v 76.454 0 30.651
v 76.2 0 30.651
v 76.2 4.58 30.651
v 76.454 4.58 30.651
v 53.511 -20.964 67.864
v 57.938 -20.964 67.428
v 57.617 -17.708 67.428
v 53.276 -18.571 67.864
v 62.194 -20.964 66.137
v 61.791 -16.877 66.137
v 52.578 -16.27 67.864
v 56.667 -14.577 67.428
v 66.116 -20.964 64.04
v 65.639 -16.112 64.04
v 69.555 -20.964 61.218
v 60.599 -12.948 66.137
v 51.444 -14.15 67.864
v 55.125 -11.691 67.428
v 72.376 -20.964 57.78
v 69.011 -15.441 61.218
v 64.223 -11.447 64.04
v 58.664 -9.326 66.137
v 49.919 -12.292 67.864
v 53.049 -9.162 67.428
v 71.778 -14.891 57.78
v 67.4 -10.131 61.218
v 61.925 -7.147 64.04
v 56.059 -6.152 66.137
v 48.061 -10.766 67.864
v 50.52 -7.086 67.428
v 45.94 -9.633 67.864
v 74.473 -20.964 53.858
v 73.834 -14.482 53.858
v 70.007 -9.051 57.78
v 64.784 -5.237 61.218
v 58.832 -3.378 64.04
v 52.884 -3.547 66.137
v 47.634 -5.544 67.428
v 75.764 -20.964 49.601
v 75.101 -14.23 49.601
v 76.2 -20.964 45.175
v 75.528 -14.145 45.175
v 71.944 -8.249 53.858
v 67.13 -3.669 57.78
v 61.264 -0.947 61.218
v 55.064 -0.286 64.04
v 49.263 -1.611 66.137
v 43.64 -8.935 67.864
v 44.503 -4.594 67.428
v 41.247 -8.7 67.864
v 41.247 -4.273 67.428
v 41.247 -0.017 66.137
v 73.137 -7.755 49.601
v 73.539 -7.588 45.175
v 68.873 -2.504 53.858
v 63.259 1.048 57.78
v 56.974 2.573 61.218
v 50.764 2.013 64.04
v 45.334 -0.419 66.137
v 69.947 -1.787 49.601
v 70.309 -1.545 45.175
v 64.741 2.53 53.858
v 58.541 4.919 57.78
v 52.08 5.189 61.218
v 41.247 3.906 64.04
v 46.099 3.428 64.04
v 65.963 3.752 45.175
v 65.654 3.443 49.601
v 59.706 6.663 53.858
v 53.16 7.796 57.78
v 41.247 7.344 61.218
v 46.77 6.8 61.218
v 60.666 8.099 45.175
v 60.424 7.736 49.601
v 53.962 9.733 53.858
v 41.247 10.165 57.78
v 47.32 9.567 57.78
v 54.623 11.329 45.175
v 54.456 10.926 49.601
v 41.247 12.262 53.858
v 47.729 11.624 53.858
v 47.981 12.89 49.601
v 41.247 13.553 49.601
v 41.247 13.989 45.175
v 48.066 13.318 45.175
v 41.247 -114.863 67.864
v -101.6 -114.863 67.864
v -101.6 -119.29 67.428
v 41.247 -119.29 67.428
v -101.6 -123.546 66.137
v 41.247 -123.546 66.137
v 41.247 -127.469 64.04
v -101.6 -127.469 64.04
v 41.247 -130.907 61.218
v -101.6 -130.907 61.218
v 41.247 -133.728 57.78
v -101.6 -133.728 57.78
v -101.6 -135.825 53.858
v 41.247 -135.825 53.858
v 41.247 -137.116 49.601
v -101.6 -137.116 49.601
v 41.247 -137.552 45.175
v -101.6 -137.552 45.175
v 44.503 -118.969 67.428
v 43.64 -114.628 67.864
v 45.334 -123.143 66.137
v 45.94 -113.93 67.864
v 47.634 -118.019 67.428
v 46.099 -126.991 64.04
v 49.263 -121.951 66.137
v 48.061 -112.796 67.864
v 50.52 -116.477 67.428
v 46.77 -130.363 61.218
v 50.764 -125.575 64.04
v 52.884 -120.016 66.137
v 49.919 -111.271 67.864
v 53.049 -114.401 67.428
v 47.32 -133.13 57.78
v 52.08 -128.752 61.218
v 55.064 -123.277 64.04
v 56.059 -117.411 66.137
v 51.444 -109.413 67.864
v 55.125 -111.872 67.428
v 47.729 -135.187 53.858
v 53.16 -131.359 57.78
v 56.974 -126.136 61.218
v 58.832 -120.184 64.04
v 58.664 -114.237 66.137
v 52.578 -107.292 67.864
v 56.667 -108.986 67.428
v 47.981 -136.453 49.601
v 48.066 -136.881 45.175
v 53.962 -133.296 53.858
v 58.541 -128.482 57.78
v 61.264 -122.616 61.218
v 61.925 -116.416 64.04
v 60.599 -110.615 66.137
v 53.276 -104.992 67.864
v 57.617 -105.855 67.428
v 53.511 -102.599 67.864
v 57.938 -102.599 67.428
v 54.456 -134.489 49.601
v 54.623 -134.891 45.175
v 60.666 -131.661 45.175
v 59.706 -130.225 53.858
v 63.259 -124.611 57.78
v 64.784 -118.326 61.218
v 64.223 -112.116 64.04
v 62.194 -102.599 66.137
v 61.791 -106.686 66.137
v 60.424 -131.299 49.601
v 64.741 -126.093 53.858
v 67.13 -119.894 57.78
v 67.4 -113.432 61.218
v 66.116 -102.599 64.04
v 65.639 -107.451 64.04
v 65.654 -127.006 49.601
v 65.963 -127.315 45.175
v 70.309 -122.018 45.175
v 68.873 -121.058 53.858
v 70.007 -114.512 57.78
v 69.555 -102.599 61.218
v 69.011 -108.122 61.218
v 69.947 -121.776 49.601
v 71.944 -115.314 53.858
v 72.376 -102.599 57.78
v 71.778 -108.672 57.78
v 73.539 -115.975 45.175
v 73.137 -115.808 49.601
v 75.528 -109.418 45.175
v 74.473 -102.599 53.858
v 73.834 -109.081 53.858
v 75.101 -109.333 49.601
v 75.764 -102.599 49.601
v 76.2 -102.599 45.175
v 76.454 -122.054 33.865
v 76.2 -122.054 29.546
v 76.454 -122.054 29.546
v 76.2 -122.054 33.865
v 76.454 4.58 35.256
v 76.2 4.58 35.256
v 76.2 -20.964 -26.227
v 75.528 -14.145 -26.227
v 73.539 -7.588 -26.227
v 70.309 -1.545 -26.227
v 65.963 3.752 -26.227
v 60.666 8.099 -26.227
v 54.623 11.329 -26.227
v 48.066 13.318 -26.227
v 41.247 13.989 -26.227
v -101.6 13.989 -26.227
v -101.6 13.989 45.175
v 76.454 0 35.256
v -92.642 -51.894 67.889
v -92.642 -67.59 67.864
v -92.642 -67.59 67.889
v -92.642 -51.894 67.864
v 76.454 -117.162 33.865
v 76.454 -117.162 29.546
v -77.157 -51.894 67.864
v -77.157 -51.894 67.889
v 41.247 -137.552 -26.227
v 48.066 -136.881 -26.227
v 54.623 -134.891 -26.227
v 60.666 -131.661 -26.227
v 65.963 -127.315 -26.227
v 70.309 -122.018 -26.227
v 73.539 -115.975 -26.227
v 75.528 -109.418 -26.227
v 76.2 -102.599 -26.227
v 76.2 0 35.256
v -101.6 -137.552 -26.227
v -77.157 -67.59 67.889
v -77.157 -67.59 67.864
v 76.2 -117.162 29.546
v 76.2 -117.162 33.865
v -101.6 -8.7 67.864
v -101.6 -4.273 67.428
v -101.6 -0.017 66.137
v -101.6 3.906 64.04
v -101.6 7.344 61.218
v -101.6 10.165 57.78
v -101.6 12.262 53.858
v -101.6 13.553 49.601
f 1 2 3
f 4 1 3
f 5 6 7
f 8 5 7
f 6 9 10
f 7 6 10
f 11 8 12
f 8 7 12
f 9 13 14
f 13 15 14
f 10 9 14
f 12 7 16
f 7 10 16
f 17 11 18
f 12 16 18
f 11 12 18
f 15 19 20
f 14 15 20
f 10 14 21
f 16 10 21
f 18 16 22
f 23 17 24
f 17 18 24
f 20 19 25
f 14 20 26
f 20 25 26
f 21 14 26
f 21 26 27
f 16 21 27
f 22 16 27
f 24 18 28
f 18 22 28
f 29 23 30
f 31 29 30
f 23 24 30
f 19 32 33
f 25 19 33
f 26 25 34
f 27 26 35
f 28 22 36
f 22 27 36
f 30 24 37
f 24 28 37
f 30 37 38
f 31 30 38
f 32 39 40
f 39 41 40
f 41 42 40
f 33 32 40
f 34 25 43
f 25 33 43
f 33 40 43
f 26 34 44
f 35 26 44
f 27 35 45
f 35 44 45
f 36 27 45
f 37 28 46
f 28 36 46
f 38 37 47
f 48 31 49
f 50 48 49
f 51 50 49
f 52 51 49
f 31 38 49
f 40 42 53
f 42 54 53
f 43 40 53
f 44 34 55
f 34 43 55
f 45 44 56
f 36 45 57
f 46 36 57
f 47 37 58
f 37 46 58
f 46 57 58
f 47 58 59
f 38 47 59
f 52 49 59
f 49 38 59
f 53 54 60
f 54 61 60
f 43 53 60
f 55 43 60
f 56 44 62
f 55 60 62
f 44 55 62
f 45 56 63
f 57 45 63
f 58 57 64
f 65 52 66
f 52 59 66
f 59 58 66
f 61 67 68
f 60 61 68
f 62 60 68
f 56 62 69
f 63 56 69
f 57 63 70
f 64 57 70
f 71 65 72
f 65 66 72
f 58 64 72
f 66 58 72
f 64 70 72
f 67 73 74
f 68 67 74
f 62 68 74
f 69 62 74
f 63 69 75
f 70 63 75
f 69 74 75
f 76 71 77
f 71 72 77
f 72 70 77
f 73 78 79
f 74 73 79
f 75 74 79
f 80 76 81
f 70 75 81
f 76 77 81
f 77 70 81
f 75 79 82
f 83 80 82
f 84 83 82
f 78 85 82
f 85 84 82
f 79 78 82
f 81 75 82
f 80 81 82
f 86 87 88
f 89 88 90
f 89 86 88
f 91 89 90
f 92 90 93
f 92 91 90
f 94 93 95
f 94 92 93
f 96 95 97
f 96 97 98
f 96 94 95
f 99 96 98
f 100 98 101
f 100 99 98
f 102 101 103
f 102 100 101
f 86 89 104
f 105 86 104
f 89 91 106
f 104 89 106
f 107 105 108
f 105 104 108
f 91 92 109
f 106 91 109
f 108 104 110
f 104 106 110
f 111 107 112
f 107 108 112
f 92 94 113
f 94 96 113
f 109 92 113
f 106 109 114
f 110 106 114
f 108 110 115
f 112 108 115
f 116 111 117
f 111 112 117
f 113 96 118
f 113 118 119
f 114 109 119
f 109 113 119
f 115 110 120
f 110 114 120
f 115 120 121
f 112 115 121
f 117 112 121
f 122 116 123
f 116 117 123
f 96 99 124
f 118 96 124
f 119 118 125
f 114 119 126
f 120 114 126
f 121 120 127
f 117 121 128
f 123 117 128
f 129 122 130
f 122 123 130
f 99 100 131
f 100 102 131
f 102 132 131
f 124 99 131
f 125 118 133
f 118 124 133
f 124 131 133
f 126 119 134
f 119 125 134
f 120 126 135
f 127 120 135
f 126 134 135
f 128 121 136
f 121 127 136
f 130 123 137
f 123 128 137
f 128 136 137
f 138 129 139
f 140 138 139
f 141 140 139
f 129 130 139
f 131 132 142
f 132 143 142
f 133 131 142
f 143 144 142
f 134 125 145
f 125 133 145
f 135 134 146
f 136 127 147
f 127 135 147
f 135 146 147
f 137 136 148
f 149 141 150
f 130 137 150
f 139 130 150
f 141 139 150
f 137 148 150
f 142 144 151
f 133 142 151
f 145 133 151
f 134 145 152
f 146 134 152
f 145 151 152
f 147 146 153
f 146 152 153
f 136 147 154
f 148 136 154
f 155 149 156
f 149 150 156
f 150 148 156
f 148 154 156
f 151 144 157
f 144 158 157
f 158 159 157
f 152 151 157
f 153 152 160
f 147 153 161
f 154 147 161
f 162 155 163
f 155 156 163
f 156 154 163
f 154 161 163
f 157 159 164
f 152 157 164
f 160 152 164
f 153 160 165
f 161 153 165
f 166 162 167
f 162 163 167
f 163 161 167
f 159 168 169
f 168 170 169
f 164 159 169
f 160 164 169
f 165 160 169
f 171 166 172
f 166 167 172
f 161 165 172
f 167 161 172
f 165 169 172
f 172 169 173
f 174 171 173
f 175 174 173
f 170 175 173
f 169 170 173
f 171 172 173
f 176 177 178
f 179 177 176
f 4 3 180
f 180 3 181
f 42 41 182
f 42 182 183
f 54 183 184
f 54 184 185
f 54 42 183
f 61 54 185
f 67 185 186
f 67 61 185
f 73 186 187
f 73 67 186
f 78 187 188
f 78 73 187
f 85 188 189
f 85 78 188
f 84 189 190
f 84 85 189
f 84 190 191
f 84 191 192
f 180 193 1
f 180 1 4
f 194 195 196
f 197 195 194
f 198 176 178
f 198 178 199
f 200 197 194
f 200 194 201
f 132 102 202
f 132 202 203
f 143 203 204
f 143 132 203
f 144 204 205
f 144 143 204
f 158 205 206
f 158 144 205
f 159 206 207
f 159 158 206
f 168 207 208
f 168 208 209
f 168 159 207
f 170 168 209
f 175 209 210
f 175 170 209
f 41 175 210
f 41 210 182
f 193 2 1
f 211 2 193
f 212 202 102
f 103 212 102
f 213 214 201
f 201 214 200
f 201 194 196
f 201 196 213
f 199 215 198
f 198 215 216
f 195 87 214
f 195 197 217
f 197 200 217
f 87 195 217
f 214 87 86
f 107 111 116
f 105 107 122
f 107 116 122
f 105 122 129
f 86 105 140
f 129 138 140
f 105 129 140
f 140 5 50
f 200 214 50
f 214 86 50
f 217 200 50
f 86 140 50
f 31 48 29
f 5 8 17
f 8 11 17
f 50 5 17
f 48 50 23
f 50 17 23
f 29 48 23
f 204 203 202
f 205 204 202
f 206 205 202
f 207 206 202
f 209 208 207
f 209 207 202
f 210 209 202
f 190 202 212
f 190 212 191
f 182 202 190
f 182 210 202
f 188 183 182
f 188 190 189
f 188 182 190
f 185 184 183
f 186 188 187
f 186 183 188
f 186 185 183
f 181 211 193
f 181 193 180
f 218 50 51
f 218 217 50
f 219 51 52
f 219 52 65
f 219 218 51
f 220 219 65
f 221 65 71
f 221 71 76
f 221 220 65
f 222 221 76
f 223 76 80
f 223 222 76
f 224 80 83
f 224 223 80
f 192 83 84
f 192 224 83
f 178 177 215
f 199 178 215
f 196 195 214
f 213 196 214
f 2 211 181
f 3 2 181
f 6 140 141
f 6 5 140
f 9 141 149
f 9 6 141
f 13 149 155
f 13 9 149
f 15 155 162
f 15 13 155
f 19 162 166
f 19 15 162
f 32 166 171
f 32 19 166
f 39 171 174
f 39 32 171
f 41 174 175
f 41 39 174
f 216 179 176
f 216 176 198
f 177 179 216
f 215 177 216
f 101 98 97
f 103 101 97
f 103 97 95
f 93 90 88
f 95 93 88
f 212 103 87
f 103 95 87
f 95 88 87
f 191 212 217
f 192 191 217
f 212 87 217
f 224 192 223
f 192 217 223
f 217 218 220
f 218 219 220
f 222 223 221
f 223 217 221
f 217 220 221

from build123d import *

# Parameters (mm, degrees)
F0_W      = 151.5413392335
F0_H      = 94.0903741866
F1_DEPTH  = 76.2
F2_DEPTH  = 101.6
F3_R      = 34.952983956
F4_R      = 22.6887790592
F5_W      = 15.484392643
F5_H      = 15.6958438456
F6_DEPTH  = 0.0254
F7_W      = 4.5801447704
F7_H      = 4.6048928052
F8_DEPTH  = 0.254
F9_W      = 4.8926994205
F9_H      = 4.318498075
F10_DEPTH = 0.254


with BuildPart() as f1:
    # F0 (on Right) → F1 (new body)
    with BuildSketch(Plane.YZ):
        with Locations((-61.7814576253, 20.8186497912)):
            Rectangle(F0_W, F0_H)
    extrude(amount=F1_DEPTH)

    # F2 (add): a face of the model
    f2_faces = [f1.faces().sort_by_distance(p)[0] for p in [
        (0, -61.7814576253, 20.8186497912),
    ]]
    extrude(f2_faces, amount=F2_DEPTH)

    # F3
    f3_edges = [f1.edges().sort_by_distance(p)[0] for p in [
        (76.2, -137.552127, 20.81865),
        (76.2, 13.989212, 20.81865),
    ]]
    fillet(f3_edges, radius=F3_R)

    # F4
    f4_edges = [f1.edges().sort_by_distance(p)[0] for p in [
        (76.2, -61.781458, 67.863837),
    ]]
    fillet(f4_edges, radius=F4_R)

    # F5 (on face) → F6 (join)
    with BuildSketch(Plane.XY.offset(67.8638368845)):
        with Locations((-84.8993882537, -59.7420018166)):
            Rectangle(F5_W, F5_H)
    extrude(amount=F6_DEPTH)


with BuildPart() as f8:
    # F7 (on face) → F8 (new body)
    with BuildSketch(Plane.YZ.offset(76.2)):
        with Locations((2.2900723852, 32.9537605867)):
            Rectangle(F7_W, F7_H)
    extrude(amount=F8_DEPTH)


with BuildPart() as f10:
    # F9 (on face) → F10 (new body)
    with BuildSketch(Plane.YZ.offset(76.2)):
        with Locations((-119.608040899, 31.7054279149)):
            Rectangle(F9_W, F9_H)
    extrude(amount=F10_DEPTH)


solid = Compound([f1.part, f8.part, f10.part])
